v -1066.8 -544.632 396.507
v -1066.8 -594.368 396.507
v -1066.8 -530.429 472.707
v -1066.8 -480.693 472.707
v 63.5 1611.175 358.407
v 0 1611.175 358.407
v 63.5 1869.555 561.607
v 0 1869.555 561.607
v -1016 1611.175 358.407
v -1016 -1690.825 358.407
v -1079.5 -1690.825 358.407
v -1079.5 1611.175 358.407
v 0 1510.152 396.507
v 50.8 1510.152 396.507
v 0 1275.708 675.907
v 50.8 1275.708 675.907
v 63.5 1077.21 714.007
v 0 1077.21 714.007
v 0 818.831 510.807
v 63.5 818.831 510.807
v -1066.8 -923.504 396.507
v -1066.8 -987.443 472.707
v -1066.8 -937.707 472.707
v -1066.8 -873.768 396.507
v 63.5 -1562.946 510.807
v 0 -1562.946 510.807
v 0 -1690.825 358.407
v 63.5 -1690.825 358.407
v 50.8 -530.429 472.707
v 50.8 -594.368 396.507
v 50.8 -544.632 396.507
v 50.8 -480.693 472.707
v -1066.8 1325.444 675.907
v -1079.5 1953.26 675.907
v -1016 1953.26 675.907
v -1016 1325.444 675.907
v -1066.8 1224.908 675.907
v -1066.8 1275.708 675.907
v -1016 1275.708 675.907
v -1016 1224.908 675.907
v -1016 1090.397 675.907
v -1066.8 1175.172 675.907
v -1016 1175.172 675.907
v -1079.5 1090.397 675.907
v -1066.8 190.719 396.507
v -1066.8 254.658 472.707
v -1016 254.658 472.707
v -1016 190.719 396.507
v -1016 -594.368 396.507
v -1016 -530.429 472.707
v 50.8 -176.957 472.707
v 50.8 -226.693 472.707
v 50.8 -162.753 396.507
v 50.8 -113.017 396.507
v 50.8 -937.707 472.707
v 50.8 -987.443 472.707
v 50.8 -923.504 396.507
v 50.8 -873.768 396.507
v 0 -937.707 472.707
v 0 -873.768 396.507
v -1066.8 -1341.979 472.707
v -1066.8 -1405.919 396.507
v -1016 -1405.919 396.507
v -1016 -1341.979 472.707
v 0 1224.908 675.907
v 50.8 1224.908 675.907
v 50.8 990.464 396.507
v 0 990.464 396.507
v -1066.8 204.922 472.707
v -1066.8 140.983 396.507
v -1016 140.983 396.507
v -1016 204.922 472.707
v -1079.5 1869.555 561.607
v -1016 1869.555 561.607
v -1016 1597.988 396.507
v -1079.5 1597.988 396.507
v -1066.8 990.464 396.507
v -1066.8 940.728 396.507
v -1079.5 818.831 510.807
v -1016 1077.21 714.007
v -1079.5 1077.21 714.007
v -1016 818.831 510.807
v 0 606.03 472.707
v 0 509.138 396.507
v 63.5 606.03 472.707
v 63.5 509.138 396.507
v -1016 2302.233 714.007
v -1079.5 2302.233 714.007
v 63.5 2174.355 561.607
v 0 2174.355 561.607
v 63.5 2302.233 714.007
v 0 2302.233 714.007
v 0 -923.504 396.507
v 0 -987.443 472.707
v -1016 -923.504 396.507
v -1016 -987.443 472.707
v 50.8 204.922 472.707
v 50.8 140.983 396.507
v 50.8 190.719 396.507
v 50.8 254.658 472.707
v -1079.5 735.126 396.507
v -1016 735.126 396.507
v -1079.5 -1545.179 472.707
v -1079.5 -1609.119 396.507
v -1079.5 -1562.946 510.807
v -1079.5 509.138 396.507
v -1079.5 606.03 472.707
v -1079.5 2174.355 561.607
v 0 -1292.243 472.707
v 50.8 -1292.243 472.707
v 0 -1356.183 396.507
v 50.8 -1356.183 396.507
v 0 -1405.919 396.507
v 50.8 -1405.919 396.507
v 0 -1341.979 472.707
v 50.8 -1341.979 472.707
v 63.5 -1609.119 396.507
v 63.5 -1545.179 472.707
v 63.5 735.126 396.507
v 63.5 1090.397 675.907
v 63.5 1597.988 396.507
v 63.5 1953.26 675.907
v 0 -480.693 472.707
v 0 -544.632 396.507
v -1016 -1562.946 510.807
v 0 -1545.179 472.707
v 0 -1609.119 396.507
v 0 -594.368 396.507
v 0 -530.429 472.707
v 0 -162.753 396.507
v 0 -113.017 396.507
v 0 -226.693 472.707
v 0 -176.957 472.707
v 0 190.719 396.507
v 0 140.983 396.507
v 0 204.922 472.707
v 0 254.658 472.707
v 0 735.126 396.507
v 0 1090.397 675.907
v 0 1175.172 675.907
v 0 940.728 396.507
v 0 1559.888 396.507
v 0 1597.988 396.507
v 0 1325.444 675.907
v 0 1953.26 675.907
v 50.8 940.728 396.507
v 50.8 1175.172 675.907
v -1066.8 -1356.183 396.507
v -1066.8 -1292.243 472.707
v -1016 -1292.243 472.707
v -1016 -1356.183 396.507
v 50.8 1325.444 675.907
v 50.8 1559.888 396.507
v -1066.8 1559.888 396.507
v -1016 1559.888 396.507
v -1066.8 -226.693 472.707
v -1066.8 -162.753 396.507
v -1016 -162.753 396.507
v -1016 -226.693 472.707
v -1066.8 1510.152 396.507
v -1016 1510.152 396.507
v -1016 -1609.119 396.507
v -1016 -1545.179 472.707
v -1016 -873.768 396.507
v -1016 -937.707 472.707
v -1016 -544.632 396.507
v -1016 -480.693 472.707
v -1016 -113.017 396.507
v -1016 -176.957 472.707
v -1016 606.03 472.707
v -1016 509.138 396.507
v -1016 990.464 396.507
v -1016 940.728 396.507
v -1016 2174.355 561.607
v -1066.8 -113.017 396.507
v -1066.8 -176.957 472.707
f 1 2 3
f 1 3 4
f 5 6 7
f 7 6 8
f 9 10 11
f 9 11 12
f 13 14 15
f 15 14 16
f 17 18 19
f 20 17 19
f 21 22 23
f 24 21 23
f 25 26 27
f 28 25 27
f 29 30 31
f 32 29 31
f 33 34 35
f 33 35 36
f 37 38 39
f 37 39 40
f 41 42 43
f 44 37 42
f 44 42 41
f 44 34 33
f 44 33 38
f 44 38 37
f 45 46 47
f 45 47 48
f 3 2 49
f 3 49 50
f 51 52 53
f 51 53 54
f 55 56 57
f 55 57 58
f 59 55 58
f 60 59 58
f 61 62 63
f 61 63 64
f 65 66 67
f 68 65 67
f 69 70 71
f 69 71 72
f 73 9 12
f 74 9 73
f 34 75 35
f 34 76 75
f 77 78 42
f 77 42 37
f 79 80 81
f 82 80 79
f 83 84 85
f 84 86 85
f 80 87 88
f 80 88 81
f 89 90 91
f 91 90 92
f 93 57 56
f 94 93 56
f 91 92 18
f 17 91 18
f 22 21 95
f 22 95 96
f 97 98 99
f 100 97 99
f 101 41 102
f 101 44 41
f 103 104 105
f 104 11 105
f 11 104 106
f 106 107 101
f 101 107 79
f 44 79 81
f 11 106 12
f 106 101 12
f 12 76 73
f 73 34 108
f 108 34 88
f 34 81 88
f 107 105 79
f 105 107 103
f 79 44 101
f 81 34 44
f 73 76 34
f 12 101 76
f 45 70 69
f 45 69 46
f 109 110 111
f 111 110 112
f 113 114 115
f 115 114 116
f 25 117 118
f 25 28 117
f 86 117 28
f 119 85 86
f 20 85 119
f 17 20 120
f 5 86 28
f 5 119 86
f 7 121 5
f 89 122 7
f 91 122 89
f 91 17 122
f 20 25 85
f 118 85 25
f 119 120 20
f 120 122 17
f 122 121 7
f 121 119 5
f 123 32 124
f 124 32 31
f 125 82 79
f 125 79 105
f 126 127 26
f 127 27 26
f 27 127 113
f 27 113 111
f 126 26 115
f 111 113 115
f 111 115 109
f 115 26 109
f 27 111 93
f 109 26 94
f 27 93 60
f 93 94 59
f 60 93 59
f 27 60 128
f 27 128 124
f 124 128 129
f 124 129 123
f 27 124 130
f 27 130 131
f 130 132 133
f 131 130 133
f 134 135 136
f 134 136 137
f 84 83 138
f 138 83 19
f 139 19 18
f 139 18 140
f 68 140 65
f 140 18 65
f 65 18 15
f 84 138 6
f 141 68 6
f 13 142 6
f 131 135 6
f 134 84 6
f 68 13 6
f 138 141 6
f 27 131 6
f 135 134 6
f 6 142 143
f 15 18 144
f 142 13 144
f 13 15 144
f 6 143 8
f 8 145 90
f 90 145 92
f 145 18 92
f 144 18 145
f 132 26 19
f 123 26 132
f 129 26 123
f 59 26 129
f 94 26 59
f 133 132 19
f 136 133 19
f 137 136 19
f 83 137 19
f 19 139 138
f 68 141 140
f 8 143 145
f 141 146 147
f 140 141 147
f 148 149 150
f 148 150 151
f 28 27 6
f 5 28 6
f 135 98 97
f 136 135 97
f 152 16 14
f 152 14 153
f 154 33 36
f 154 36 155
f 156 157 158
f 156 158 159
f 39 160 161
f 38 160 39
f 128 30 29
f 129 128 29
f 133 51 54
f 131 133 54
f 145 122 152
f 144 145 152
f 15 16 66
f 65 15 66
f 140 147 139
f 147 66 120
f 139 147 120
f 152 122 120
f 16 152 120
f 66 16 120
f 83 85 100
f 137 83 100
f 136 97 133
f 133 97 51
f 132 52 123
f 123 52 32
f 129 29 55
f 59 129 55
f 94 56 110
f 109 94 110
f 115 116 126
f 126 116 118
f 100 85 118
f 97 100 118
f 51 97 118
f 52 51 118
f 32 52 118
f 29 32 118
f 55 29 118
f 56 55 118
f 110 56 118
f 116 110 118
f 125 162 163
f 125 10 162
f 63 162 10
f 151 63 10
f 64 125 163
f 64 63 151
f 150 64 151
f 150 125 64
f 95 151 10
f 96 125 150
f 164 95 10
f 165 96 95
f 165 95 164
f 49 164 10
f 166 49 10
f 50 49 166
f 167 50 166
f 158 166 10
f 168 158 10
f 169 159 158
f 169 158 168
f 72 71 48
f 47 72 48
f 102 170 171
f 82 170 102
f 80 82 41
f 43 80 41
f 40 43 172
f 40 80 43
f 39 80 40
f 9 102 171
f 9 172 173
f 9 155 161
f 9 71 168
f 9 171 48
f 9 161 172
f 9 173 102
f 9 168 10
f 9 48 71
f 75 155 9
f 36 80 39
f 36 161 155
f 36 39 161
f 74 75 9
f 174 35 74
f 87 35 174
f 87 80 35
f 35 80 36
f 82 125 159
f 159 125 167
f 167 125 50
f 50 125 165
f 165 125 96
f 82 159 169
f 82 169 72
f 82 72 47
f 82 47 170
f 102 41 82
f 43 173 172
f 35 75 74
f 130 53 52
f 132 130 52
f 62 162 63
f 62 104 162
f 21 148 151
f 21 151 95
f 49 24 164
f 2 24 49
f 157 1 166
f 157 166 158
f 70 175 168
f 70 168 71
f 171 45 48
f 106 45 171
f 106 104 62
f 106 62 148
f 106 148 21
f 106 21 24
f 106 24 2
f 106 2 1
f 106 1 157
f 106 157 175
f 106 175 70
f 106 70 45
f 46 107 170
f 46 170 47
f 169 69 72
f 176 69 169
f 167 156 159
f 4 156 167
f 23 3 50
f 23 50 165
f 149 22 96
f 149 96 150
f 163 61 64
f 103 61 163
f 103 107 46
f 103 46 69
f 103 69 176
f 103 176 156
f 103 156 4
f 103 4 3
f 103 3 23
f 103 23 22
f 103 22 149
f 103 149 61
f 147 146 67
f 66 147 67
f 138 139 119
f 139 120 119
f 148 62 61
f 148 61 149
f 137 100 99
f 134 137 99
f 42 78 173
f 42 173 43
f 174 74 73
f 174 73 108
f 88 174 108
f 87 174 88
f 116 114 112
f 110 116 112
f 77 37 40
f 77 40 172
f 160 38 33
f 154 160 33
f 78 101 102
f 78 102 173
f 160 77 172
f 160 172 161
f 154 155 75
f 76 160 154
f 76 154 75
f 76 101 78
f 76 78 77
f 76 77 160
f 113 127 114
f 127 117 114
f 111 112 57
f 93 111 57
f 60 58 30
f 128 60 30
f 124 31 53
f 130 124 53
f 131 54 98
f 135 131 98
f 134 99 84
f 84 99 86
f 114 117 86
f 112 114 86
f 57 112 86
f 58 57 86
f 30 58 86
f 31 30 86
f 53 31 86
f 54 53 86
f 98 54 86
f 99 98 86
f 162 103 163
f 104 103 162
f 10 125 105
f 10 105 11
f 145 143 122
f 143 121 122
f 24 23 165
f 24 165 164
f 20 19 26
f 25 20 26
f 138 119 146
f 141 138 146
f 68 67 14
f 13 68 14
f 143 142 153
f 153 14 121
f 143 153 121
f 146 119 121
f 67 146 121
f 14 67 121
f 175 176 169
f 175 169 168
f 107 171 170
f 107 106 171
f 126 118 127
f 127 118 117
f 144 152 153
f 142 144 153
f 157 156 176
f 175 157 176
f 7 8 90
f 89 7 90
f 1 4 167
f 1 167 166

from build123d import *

# Parameters (mm, degrees)
F1_DEPTH = 63.5
F3_DEPTH = 12.7
F5_DEPTH = 50.8


with BuildPart() as f1:
    # F0 (on Right) → F1 (new body)
    with BuildSketch(Plane.YZ):
        Polygon((-1562.9458051886, 510.8066391747), (-1690.82458898, 358.4066391747), (1611.17541102, 358.4066391747), (1869.5545340028, 561.6066391747), (2174.3545340028, 561.6066391747), (2302.2333177942, 714.0066391747), (1077.2100303276, 714.0066391747), (818.8309073448, 510.8066391747), align=None)
    extrude(amount=F1_DEPTH)

    # F2 (on face) → F3 (cut)
    with BuildSketch(Plane.YZ.offset(63.5)):
        Polygon((1090.3969976379, 675.9066391747), (832.0178746551, 472.7066391747), (735.1257035365, 396.5066391747), (1597.9884437098, 396.5066391747), (1953.2597378111, 675.9066391747), align=None)
        Polygon((606.0300141335, 472.7066391747), (-1545.1794834129, 472.7066391747), (-1609.1188753086, 396.5066391747), (509.1378430149, 396.5066391747), align=None)
    extrude(amount=-F3_DEPTH, mode=Mode.SUBTRACT)

    # F4 (on face) → F5 (cut, through all)
    with BuildSketch(Plane.YZ.offset(50.8)):
        Polygon((735.1257035365, 396.5066391747), (940.7275343608, 396.5066391747), (1175.1719713117, 675.9066391747), (1090.3969976379, 675.9066391747), align=None)
        Polygon((1224.9079890353, 675.9066391747), (990.4635520843, 396.5066391747), (1510.1524259862, 396.5066391747), (1275.7079890353, 675.9066391747), align=None)
        Polygon((1325.4440067588, 675.9066391747), (1559.8884437098, 396.5066391747), (1597.9884437098, 396.5066391747), (1953.2597378111, 675.9066391747), align=None)
        Polygon((606.0300141335, 472.7066391747), (254.6581727878, 472.7066391747), (190.718780892, 396.5066391747), (509.1378430149, 396.5066391747), align=None)
        Polygon((204.9221550642, 472.7066391747), (-176.9566287272, 472.7066391747), (-113.0172368315, 396.5066391747), (140.9827631685, 396.5066391747), align=None)
        Polygon((-226.6926464508, 472.7066391747), (-480.6926464508, 472.7066391747), (-544.6320383465, 396.5066391747), (-162.7532545551, 396.5066391747), align=None)
        Polygon((-1341.9794834129, 472.7066391747), (-1545.1794834129, 472.7066391747), (-1609.1188753086, 396.5066391747), (-1405.9188753086, 396.5066391747), align=None)
        Polygon((-987.4434656893, 472.7066391747), (-1292.2434656893, 472.7066391747), (-1356.182857585, 396.5066391747), (-923.5040737936, 396.5066391747), align=None)
        Polygon((-530.4286641743, 472.7066391747), (-937.7074479658, 472.7066391747), (-873.76805607, 396.5066391747), (-594.36805607, 396.5066391747), align=None)
    extrude(amount=-F5_DEPTH, mode=Mode.SUBTRACT)


with BuildPart() as f7_1:
    # F7: instance of F1
    add(f1.part.mirror(Plane.YZ.offset(-508)))


solid = Compound([f1.part, f7_1.part])
